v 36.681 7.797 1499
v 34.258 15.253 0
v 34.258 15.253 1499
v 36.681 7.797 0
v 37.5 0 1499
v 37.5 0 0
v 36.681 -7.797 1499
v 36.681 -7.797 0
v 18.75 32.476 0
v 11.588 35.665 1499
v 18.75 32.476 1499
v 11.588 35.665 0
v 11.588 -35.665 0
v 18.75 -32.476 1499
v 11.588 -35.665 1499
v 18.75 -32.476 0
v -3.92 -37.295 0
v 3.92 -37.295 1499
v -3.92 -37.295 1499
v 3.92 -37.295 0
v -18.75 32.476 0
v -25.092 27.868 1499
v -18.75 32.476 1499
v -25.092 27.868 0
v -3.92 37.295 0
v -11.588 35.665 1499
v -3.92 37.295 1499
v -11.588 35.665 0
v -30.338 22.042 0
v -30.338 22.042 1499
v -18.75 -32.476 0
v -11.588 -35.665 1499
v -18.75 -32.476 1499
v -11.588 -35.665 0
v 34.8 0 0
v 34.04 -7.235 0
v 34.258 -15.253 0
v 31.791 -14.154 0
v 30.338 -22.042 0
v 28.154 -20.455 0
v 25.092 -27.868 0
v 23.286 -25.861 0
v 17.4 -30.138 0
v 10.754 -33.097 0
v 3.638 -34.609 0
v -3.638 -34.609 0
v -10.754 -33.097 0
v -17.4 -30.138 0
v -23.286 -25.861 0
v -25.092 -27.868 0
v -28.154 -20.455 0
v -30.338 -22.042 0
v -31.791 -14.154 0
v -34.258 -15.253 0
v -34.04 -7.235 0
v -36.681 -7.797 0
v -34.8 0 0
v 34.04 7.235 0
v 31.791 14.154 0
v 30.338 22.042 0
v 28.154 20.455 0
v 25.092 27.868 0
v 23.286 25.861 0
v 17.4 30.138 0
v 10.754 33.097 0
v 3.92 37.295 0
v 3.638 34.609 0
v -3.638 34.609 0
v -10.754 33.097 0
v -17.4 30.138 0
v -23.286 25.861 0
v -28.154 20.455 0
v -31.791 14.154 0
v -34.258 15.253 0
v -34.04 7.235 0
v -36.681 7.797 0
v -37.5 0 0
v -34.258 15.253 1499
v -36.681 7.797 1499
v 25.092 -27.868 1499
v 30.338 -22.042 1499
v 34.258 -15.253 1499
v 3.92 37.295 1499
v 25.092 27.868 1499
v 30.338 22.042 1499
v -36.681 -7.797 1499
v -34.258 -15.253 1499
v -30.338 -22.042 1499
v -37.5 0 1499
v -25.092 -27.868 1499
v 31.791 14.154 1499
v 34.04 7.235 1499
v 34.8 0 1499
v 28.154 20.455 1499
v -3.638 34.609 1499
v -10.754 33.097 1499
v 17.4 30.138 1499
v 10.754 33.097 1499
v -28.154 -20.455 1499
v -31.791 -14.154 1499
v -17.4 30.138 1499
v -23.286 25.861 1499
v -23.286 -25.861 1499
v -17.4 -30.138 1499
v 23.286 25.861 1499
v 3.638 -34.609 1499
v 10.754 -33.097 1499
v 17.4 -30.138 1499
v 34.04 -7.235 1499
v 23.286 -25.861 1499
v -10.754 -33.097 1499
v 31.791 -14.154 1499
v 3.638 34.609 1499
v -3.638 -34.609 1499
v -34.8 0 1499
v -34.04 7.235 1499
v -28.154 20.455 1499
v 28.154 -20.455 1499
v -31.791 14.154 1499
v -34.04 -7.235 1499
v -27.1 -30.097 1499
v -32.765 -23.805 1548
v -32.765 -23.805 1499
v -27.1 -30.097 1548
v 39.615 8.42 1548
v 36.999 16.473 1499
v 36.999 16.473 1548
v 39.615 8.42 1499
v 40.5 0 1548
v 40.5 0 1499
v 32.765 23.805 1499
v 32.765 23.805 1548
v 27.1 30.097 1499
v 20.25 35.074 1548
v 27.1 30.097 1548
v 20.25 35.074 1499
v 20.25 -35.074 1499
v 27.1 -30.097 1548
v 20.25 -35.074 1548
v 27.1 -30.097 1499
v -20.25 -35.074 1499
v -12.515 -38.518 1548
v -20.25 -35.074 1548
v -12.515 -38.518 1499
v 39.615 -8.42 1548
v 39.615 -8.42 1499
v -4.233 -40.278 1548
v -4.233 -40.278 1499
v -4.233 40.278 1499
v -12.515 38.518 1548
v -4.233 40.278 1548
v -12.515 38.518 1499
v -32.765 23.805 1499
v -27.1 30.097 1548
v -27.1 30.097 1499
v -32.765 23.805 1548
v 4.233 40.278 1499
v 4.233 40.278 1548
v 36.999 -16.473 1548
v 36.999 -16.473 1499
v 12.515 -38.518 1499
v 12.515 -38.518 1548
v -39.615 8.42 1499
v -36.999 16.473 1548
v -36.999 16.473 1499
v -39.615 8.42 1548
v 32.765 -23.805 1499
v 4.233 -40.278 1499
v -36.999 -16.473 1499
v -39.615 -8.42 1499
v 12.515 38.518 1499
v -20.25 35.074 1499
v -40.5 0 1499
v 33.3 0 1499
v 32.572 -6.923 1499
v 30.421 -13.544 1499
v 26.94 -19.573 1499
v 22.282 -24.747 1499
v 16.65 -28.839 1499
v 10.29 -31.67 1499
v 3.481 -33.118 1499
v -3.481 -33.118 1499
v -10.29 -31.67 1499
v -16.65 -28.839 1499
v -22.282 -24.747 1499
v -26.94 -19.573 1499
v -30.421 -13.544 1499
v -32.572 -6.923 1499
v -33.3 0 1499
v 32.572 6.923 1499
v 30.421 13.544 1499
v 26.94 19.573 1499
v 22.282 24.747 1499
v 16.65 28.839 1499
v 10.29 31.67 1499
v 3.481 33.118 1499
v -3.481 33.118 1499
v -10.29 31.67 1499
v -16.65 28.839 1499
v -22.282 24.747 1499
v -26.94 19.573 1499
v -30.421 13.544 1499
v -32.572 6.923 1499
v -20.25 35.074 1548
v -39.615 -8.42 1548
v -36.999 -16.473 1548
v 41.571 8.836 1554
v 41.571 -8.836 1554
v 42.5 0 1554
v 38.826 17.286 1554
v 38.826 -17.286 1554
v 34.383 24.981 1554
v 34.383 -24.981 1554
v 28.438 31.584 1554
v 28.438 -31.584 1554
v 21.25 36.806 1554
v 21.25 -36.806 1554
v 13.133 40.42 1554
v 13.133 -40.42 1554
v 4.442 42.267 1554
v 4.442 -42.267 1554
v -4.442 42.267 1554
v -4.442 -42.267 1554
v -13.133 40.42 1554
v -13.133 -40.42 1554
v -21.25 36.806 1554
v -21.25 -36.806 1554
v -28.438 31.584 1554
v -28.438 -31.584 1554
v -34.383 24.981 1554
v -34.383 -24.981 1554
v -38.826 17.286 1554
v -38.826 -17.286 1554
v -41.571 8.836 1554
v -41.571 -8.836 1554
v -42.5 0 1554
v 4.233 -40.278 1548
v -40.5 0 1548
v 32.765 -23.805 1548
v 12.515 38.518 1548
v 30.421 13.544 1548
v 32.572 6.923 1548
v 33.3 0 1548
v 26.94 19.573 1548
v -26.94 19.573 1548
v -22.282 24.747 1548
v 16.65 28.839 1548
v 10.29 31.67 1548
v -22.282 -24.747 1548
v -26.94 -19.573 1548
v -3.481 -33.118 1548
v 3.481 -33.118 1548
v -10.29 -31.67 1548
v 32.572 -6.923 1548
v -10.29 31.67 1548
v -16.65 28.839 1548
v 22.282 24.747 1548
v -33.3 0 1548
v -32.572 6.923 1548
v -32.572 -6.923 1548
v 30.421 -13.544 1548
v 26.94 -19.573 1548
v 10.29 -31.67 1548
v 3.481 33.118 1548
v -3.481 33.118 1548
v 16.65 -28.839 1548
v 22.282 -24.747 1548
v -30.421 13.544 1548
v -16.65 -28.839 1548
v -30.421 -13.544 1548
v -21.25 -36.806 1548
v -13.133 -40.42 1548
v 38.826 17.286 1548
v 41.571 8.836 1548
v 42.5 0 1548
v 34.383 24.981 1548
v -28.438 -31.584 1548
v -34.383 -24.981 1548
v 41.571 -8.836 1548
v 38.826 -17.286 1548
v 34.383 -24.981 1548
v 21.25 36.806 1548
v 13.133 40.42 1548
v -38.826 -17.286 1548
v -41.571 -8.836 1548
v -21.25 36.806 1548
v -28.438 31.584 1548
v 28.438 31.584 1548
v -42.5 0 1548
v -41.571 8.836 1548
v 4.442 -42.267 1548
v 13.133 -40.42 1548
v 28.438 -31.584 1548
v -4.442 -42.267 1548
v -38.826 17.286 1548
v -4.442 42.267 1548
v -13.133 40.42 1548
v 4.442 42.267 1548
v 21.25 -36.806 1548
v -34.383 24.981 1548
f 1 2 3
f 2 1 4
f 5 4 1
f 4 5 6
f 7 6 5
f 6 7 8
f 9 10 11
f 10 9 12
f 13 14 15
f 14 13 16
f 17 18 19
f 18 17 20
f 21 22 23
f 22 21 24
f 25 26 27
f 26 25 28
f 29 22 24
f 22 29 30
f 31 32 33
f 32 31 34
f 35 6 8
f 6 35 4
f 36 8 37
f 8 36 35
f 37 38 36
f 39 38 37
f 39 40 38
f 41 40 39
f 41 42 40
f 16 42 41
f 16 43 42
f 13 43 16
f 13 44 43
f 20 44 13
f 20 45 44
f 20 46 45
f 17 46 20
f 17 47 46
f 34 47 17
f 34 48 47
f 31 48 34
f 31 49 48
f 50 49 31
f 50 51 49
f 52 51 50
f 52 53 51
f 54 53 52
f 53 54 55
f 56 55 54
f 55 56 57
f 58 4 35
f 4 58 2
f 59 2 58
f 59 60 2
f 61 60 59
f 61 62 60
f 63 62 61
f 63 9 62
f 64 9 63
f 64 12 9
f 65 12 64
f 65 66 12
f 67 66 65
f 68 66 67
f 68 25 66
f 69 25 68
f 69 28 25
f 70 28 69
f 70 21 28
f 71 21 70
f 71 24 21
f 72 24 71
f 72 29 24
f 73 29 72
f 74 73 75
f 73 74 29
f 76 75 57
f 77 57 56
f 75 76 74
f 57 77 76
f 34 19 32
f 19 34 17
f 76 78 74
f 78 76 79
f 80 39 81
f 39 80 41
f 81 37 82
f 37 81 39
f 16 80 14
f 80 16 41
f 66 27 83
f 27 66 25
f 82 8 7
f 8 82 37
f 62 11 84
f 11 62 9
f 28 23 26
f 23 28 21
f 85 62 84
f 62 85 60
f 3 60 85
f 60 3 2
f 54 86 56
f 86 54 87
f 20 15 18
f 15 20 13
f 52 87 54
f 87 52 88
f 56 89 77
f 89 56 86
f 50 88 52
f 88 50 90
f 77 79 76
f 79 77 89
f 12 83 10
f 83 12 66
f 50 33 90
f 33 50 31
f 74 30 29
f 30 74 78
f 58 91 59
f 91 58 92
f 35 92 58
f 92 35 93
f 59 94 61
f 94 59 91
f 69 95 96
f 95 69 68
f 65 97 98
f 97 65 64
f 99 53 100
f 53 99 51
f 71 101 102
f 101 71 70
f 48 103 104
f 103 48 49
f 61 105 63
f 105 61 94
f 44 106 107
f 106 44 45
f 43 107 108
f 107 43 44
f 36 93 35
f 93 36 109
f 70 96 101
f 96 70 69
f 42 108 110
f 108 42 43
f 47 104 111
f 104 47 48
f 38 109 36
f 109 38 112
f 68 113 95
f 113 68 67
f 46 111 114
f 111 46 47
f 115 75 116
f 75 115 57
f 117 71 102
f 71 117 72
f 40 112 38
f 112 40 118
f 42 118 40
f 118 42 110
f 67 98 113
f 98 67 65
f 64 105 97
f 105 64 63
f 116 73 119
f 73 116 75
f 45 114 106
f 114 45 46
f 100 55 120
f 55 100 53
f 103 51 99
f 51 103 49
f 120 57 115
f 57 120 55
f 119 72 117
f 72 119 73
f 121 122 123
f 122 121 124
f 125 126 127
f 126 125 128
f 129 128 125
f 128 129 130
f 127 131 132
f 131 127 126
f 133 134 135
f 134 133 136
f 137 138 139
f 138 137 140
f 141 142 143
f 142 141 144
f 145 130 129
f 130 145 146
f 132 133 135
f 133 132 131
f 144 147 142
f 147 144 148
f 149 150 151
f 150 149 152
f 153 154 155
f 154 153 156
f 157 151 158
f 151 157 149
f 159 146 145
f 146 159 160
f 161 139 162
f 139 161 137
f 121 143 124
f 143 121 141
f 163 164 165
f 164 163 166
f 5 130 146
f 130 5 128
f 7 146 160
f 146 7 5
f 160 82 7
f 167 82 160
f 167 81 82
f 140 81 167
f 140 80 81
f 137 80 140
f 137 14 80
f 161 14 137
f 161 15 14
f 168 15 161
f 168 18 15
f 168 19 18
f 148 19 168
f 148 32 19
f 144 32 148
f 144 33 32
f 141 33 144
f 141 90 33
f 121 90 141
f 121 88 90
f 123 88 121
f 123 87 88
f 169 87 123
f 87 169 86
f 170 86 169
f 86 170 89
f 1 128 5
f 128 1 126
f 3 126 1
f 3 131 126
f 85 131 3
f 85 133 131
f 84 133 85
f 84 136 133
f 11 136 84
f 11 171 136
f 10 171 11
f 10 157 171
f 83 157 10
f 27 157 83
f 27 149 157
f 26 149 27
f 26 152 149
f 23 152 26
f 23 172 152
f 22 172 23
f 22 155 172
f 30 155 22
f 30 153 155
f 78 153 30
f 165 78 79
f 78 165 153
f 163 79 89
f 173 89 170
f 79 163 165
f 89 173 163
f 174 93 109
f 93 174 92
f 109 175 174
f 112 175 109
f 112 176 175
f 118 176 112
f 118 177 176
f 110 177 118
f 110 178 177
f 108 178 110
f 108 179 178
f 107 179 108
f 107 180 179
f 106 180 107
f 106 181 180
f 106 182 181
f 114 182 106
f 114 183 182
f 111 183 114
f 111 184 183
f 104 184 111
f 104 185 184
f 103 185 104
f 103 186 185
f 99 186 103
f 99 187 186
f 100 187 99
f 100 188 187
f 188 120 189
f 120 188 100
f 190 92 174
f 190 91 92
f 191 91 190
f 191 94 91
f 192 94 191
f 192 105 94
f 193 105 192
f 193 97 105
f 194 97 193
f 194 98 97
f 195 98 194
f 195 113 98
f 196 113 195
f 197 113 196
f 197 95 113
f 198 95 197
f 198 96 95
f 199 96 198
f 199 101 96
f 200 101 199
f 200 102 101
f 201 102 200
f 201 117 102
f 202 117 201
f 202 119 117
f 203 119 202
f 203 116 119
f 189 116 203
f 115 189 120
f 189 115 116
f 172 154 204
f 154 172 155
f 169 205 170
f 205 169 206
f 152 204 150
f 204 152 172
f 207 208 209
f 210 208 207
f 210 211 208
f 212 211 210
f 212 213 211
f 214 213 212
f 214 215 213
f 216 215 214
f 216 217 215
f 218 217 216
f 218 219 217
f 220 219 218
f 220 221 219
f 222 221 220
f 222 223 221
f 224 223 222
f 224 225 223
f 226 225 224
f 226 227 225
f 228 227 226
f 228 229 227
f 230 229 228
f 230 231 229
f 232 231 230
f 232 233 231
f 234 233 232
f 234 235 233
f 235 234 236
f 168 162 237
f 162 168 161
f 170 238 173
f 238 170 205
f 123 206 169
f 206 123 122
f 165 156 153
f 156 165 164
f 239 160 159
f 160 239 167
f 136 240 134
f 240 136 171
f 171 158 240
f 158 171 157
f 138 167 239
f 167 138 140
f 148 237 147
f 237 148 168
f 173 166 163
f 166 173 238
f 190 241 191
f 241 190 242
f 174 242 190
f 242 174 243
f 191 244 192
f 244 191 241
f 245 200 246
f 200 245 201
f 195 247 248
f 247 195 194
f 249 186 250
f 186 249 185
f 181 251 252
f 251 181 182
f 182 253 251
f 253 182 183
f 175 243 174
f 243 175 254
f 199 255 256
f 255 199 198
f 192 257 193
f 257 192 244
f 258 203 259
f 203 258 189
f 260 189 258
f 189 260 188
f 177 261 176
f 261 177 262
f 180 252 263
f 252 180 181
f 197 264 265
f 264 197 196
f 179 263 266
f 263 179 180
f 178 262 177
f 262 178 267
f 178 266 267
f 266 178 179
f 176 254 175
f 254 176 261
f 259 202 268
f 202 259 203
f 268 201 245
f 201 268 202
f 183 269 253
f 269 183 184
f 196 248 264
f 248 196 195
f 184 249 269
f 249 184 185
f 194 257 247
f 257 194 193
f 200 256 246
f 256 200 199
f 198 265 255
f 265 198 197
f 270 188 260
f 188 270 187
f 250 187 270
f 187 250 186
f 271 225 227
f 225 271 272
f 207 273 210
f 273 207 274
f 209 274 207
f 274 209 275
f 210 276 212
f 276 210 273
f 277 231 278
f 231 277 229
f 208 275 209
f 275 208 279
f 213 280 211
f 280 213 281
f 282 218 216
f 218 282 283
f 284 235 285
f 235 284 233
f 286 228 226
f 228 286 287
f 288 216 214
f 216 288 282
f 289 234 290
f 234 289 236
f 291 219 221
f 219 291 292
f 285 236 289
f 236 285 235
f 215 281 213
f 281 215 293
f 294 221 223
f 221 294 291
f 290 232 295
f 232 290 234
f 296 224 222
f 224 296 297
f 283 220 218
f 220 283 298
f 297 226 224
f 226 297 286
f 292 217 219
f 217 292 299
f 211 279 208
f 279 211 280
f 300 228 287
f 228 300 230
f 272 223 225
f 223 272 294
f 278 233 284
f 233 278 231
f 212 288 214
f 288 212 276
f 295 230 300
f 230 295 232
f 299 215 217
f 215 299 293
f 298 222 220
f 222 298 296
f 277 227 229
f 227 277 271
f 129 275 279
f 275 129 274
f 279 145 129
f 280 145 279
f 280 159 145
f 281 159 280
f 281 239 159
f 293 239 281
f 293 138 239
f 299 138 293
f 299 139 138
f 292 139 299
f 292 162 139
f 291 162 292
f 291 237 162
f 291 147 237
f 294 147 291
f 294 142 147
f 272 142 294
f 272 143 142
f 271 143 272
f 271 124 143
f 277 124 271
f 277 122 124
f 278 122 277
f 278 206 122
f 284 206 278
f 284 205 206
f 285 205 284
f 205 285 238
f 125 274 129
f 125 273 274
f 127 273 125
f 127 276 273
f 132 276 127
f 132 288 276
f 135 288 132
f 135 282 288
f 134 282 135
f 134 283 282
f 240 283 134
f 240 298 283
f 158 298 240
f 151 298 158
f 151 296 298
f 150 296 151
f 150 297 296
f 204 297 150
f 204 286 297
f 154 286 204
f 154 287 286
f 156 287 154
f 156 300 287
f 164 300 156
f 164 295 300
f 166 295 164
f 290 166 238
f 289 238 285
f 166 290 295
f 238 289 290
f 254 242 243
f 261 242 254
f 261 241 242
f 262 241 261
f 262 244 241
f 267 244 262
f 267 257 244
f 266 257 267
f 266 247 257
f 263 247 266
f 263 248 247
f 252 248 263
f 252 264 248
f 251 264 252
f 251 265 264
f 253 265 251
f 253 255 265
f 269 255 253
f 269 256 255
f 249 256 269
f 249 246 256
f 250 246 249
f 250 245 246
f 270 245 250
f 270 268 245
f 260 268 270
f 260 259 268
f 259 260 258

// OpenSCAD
// Parameters
nominal_size = 75; //[40:160:1]
length_mm = 1500; //[750:3000:10]
include_end_fitting = 1; //[0:1:1]
od_mm = 75; //[40:160:1]
wall_mm = 2.7; //[1.5:6:0.1]
fit_len_mm = 55; //[25:120:1]
fit_od_extra_mm = 6; //[2:15:0.5]
fit_socket_wall_extra_mm = 1.5; //[0.5:4:0.1]
fit_stop_ring_len_mm = 6; //[2:15:0.5]
fit_stop_ring_extra_mm = 2; //[0.5:6:0.1]
overlap_mm = 1; //[0.5:2:0.1]

// Module for the hollow tube
module hollow_tube() {
  color([0.85, 0.85, 0.8]) {
    difference() {
      // Outer tube
      cylinder(r=od_mm/2, h=length_mm, center=false);
      // Inner void
      translate([0, 0, -overlap_mm])
        cylinder(r=od_mm/2 - wall_mm, h=length_mm + 2*overlap_mm, center=false);
    }
  }
}

// Module for the end fitting
module end_fitting() {
  if (include_end_fitting) {
    color([0.85, 0.85, 0.8]) {
      union() {
        difference() {
          // Outer fitting
          translate([0, 0, length_mm - overlap_mm])
            cylinder(r=od_mm/2 + fit_od_extra_mm/2, h=fit_len_mm, center=false);
          // Inner void
          translate([0, 0, length_mm - 2*overlap_mm])
            cylinder(r=od_mm/2 - wall_mm - fit_socket_wall_extra_mm, h=fit_len_mm + 2*overlap_mm, center=false);
        }
        // Stop ring
        translate([0, 0, length_mm + fit_len_mm - fit_stop_ring_len_mm - overlap_mm])
          cylinder(r=od_mm/2 + fit_od_extra_mm/2 + fit_stop_ring_extra_mm, h=fit_stop_ring_len_mm, center=false);
      }
    }
  }
}

// Module for the complete HT pipe
module ht_pipe() {
  union() {
    hollow_tube();
    end_fitting();
  }
}

// Assembly
module assembly() {
  ht_pipe();
}

assembly();
